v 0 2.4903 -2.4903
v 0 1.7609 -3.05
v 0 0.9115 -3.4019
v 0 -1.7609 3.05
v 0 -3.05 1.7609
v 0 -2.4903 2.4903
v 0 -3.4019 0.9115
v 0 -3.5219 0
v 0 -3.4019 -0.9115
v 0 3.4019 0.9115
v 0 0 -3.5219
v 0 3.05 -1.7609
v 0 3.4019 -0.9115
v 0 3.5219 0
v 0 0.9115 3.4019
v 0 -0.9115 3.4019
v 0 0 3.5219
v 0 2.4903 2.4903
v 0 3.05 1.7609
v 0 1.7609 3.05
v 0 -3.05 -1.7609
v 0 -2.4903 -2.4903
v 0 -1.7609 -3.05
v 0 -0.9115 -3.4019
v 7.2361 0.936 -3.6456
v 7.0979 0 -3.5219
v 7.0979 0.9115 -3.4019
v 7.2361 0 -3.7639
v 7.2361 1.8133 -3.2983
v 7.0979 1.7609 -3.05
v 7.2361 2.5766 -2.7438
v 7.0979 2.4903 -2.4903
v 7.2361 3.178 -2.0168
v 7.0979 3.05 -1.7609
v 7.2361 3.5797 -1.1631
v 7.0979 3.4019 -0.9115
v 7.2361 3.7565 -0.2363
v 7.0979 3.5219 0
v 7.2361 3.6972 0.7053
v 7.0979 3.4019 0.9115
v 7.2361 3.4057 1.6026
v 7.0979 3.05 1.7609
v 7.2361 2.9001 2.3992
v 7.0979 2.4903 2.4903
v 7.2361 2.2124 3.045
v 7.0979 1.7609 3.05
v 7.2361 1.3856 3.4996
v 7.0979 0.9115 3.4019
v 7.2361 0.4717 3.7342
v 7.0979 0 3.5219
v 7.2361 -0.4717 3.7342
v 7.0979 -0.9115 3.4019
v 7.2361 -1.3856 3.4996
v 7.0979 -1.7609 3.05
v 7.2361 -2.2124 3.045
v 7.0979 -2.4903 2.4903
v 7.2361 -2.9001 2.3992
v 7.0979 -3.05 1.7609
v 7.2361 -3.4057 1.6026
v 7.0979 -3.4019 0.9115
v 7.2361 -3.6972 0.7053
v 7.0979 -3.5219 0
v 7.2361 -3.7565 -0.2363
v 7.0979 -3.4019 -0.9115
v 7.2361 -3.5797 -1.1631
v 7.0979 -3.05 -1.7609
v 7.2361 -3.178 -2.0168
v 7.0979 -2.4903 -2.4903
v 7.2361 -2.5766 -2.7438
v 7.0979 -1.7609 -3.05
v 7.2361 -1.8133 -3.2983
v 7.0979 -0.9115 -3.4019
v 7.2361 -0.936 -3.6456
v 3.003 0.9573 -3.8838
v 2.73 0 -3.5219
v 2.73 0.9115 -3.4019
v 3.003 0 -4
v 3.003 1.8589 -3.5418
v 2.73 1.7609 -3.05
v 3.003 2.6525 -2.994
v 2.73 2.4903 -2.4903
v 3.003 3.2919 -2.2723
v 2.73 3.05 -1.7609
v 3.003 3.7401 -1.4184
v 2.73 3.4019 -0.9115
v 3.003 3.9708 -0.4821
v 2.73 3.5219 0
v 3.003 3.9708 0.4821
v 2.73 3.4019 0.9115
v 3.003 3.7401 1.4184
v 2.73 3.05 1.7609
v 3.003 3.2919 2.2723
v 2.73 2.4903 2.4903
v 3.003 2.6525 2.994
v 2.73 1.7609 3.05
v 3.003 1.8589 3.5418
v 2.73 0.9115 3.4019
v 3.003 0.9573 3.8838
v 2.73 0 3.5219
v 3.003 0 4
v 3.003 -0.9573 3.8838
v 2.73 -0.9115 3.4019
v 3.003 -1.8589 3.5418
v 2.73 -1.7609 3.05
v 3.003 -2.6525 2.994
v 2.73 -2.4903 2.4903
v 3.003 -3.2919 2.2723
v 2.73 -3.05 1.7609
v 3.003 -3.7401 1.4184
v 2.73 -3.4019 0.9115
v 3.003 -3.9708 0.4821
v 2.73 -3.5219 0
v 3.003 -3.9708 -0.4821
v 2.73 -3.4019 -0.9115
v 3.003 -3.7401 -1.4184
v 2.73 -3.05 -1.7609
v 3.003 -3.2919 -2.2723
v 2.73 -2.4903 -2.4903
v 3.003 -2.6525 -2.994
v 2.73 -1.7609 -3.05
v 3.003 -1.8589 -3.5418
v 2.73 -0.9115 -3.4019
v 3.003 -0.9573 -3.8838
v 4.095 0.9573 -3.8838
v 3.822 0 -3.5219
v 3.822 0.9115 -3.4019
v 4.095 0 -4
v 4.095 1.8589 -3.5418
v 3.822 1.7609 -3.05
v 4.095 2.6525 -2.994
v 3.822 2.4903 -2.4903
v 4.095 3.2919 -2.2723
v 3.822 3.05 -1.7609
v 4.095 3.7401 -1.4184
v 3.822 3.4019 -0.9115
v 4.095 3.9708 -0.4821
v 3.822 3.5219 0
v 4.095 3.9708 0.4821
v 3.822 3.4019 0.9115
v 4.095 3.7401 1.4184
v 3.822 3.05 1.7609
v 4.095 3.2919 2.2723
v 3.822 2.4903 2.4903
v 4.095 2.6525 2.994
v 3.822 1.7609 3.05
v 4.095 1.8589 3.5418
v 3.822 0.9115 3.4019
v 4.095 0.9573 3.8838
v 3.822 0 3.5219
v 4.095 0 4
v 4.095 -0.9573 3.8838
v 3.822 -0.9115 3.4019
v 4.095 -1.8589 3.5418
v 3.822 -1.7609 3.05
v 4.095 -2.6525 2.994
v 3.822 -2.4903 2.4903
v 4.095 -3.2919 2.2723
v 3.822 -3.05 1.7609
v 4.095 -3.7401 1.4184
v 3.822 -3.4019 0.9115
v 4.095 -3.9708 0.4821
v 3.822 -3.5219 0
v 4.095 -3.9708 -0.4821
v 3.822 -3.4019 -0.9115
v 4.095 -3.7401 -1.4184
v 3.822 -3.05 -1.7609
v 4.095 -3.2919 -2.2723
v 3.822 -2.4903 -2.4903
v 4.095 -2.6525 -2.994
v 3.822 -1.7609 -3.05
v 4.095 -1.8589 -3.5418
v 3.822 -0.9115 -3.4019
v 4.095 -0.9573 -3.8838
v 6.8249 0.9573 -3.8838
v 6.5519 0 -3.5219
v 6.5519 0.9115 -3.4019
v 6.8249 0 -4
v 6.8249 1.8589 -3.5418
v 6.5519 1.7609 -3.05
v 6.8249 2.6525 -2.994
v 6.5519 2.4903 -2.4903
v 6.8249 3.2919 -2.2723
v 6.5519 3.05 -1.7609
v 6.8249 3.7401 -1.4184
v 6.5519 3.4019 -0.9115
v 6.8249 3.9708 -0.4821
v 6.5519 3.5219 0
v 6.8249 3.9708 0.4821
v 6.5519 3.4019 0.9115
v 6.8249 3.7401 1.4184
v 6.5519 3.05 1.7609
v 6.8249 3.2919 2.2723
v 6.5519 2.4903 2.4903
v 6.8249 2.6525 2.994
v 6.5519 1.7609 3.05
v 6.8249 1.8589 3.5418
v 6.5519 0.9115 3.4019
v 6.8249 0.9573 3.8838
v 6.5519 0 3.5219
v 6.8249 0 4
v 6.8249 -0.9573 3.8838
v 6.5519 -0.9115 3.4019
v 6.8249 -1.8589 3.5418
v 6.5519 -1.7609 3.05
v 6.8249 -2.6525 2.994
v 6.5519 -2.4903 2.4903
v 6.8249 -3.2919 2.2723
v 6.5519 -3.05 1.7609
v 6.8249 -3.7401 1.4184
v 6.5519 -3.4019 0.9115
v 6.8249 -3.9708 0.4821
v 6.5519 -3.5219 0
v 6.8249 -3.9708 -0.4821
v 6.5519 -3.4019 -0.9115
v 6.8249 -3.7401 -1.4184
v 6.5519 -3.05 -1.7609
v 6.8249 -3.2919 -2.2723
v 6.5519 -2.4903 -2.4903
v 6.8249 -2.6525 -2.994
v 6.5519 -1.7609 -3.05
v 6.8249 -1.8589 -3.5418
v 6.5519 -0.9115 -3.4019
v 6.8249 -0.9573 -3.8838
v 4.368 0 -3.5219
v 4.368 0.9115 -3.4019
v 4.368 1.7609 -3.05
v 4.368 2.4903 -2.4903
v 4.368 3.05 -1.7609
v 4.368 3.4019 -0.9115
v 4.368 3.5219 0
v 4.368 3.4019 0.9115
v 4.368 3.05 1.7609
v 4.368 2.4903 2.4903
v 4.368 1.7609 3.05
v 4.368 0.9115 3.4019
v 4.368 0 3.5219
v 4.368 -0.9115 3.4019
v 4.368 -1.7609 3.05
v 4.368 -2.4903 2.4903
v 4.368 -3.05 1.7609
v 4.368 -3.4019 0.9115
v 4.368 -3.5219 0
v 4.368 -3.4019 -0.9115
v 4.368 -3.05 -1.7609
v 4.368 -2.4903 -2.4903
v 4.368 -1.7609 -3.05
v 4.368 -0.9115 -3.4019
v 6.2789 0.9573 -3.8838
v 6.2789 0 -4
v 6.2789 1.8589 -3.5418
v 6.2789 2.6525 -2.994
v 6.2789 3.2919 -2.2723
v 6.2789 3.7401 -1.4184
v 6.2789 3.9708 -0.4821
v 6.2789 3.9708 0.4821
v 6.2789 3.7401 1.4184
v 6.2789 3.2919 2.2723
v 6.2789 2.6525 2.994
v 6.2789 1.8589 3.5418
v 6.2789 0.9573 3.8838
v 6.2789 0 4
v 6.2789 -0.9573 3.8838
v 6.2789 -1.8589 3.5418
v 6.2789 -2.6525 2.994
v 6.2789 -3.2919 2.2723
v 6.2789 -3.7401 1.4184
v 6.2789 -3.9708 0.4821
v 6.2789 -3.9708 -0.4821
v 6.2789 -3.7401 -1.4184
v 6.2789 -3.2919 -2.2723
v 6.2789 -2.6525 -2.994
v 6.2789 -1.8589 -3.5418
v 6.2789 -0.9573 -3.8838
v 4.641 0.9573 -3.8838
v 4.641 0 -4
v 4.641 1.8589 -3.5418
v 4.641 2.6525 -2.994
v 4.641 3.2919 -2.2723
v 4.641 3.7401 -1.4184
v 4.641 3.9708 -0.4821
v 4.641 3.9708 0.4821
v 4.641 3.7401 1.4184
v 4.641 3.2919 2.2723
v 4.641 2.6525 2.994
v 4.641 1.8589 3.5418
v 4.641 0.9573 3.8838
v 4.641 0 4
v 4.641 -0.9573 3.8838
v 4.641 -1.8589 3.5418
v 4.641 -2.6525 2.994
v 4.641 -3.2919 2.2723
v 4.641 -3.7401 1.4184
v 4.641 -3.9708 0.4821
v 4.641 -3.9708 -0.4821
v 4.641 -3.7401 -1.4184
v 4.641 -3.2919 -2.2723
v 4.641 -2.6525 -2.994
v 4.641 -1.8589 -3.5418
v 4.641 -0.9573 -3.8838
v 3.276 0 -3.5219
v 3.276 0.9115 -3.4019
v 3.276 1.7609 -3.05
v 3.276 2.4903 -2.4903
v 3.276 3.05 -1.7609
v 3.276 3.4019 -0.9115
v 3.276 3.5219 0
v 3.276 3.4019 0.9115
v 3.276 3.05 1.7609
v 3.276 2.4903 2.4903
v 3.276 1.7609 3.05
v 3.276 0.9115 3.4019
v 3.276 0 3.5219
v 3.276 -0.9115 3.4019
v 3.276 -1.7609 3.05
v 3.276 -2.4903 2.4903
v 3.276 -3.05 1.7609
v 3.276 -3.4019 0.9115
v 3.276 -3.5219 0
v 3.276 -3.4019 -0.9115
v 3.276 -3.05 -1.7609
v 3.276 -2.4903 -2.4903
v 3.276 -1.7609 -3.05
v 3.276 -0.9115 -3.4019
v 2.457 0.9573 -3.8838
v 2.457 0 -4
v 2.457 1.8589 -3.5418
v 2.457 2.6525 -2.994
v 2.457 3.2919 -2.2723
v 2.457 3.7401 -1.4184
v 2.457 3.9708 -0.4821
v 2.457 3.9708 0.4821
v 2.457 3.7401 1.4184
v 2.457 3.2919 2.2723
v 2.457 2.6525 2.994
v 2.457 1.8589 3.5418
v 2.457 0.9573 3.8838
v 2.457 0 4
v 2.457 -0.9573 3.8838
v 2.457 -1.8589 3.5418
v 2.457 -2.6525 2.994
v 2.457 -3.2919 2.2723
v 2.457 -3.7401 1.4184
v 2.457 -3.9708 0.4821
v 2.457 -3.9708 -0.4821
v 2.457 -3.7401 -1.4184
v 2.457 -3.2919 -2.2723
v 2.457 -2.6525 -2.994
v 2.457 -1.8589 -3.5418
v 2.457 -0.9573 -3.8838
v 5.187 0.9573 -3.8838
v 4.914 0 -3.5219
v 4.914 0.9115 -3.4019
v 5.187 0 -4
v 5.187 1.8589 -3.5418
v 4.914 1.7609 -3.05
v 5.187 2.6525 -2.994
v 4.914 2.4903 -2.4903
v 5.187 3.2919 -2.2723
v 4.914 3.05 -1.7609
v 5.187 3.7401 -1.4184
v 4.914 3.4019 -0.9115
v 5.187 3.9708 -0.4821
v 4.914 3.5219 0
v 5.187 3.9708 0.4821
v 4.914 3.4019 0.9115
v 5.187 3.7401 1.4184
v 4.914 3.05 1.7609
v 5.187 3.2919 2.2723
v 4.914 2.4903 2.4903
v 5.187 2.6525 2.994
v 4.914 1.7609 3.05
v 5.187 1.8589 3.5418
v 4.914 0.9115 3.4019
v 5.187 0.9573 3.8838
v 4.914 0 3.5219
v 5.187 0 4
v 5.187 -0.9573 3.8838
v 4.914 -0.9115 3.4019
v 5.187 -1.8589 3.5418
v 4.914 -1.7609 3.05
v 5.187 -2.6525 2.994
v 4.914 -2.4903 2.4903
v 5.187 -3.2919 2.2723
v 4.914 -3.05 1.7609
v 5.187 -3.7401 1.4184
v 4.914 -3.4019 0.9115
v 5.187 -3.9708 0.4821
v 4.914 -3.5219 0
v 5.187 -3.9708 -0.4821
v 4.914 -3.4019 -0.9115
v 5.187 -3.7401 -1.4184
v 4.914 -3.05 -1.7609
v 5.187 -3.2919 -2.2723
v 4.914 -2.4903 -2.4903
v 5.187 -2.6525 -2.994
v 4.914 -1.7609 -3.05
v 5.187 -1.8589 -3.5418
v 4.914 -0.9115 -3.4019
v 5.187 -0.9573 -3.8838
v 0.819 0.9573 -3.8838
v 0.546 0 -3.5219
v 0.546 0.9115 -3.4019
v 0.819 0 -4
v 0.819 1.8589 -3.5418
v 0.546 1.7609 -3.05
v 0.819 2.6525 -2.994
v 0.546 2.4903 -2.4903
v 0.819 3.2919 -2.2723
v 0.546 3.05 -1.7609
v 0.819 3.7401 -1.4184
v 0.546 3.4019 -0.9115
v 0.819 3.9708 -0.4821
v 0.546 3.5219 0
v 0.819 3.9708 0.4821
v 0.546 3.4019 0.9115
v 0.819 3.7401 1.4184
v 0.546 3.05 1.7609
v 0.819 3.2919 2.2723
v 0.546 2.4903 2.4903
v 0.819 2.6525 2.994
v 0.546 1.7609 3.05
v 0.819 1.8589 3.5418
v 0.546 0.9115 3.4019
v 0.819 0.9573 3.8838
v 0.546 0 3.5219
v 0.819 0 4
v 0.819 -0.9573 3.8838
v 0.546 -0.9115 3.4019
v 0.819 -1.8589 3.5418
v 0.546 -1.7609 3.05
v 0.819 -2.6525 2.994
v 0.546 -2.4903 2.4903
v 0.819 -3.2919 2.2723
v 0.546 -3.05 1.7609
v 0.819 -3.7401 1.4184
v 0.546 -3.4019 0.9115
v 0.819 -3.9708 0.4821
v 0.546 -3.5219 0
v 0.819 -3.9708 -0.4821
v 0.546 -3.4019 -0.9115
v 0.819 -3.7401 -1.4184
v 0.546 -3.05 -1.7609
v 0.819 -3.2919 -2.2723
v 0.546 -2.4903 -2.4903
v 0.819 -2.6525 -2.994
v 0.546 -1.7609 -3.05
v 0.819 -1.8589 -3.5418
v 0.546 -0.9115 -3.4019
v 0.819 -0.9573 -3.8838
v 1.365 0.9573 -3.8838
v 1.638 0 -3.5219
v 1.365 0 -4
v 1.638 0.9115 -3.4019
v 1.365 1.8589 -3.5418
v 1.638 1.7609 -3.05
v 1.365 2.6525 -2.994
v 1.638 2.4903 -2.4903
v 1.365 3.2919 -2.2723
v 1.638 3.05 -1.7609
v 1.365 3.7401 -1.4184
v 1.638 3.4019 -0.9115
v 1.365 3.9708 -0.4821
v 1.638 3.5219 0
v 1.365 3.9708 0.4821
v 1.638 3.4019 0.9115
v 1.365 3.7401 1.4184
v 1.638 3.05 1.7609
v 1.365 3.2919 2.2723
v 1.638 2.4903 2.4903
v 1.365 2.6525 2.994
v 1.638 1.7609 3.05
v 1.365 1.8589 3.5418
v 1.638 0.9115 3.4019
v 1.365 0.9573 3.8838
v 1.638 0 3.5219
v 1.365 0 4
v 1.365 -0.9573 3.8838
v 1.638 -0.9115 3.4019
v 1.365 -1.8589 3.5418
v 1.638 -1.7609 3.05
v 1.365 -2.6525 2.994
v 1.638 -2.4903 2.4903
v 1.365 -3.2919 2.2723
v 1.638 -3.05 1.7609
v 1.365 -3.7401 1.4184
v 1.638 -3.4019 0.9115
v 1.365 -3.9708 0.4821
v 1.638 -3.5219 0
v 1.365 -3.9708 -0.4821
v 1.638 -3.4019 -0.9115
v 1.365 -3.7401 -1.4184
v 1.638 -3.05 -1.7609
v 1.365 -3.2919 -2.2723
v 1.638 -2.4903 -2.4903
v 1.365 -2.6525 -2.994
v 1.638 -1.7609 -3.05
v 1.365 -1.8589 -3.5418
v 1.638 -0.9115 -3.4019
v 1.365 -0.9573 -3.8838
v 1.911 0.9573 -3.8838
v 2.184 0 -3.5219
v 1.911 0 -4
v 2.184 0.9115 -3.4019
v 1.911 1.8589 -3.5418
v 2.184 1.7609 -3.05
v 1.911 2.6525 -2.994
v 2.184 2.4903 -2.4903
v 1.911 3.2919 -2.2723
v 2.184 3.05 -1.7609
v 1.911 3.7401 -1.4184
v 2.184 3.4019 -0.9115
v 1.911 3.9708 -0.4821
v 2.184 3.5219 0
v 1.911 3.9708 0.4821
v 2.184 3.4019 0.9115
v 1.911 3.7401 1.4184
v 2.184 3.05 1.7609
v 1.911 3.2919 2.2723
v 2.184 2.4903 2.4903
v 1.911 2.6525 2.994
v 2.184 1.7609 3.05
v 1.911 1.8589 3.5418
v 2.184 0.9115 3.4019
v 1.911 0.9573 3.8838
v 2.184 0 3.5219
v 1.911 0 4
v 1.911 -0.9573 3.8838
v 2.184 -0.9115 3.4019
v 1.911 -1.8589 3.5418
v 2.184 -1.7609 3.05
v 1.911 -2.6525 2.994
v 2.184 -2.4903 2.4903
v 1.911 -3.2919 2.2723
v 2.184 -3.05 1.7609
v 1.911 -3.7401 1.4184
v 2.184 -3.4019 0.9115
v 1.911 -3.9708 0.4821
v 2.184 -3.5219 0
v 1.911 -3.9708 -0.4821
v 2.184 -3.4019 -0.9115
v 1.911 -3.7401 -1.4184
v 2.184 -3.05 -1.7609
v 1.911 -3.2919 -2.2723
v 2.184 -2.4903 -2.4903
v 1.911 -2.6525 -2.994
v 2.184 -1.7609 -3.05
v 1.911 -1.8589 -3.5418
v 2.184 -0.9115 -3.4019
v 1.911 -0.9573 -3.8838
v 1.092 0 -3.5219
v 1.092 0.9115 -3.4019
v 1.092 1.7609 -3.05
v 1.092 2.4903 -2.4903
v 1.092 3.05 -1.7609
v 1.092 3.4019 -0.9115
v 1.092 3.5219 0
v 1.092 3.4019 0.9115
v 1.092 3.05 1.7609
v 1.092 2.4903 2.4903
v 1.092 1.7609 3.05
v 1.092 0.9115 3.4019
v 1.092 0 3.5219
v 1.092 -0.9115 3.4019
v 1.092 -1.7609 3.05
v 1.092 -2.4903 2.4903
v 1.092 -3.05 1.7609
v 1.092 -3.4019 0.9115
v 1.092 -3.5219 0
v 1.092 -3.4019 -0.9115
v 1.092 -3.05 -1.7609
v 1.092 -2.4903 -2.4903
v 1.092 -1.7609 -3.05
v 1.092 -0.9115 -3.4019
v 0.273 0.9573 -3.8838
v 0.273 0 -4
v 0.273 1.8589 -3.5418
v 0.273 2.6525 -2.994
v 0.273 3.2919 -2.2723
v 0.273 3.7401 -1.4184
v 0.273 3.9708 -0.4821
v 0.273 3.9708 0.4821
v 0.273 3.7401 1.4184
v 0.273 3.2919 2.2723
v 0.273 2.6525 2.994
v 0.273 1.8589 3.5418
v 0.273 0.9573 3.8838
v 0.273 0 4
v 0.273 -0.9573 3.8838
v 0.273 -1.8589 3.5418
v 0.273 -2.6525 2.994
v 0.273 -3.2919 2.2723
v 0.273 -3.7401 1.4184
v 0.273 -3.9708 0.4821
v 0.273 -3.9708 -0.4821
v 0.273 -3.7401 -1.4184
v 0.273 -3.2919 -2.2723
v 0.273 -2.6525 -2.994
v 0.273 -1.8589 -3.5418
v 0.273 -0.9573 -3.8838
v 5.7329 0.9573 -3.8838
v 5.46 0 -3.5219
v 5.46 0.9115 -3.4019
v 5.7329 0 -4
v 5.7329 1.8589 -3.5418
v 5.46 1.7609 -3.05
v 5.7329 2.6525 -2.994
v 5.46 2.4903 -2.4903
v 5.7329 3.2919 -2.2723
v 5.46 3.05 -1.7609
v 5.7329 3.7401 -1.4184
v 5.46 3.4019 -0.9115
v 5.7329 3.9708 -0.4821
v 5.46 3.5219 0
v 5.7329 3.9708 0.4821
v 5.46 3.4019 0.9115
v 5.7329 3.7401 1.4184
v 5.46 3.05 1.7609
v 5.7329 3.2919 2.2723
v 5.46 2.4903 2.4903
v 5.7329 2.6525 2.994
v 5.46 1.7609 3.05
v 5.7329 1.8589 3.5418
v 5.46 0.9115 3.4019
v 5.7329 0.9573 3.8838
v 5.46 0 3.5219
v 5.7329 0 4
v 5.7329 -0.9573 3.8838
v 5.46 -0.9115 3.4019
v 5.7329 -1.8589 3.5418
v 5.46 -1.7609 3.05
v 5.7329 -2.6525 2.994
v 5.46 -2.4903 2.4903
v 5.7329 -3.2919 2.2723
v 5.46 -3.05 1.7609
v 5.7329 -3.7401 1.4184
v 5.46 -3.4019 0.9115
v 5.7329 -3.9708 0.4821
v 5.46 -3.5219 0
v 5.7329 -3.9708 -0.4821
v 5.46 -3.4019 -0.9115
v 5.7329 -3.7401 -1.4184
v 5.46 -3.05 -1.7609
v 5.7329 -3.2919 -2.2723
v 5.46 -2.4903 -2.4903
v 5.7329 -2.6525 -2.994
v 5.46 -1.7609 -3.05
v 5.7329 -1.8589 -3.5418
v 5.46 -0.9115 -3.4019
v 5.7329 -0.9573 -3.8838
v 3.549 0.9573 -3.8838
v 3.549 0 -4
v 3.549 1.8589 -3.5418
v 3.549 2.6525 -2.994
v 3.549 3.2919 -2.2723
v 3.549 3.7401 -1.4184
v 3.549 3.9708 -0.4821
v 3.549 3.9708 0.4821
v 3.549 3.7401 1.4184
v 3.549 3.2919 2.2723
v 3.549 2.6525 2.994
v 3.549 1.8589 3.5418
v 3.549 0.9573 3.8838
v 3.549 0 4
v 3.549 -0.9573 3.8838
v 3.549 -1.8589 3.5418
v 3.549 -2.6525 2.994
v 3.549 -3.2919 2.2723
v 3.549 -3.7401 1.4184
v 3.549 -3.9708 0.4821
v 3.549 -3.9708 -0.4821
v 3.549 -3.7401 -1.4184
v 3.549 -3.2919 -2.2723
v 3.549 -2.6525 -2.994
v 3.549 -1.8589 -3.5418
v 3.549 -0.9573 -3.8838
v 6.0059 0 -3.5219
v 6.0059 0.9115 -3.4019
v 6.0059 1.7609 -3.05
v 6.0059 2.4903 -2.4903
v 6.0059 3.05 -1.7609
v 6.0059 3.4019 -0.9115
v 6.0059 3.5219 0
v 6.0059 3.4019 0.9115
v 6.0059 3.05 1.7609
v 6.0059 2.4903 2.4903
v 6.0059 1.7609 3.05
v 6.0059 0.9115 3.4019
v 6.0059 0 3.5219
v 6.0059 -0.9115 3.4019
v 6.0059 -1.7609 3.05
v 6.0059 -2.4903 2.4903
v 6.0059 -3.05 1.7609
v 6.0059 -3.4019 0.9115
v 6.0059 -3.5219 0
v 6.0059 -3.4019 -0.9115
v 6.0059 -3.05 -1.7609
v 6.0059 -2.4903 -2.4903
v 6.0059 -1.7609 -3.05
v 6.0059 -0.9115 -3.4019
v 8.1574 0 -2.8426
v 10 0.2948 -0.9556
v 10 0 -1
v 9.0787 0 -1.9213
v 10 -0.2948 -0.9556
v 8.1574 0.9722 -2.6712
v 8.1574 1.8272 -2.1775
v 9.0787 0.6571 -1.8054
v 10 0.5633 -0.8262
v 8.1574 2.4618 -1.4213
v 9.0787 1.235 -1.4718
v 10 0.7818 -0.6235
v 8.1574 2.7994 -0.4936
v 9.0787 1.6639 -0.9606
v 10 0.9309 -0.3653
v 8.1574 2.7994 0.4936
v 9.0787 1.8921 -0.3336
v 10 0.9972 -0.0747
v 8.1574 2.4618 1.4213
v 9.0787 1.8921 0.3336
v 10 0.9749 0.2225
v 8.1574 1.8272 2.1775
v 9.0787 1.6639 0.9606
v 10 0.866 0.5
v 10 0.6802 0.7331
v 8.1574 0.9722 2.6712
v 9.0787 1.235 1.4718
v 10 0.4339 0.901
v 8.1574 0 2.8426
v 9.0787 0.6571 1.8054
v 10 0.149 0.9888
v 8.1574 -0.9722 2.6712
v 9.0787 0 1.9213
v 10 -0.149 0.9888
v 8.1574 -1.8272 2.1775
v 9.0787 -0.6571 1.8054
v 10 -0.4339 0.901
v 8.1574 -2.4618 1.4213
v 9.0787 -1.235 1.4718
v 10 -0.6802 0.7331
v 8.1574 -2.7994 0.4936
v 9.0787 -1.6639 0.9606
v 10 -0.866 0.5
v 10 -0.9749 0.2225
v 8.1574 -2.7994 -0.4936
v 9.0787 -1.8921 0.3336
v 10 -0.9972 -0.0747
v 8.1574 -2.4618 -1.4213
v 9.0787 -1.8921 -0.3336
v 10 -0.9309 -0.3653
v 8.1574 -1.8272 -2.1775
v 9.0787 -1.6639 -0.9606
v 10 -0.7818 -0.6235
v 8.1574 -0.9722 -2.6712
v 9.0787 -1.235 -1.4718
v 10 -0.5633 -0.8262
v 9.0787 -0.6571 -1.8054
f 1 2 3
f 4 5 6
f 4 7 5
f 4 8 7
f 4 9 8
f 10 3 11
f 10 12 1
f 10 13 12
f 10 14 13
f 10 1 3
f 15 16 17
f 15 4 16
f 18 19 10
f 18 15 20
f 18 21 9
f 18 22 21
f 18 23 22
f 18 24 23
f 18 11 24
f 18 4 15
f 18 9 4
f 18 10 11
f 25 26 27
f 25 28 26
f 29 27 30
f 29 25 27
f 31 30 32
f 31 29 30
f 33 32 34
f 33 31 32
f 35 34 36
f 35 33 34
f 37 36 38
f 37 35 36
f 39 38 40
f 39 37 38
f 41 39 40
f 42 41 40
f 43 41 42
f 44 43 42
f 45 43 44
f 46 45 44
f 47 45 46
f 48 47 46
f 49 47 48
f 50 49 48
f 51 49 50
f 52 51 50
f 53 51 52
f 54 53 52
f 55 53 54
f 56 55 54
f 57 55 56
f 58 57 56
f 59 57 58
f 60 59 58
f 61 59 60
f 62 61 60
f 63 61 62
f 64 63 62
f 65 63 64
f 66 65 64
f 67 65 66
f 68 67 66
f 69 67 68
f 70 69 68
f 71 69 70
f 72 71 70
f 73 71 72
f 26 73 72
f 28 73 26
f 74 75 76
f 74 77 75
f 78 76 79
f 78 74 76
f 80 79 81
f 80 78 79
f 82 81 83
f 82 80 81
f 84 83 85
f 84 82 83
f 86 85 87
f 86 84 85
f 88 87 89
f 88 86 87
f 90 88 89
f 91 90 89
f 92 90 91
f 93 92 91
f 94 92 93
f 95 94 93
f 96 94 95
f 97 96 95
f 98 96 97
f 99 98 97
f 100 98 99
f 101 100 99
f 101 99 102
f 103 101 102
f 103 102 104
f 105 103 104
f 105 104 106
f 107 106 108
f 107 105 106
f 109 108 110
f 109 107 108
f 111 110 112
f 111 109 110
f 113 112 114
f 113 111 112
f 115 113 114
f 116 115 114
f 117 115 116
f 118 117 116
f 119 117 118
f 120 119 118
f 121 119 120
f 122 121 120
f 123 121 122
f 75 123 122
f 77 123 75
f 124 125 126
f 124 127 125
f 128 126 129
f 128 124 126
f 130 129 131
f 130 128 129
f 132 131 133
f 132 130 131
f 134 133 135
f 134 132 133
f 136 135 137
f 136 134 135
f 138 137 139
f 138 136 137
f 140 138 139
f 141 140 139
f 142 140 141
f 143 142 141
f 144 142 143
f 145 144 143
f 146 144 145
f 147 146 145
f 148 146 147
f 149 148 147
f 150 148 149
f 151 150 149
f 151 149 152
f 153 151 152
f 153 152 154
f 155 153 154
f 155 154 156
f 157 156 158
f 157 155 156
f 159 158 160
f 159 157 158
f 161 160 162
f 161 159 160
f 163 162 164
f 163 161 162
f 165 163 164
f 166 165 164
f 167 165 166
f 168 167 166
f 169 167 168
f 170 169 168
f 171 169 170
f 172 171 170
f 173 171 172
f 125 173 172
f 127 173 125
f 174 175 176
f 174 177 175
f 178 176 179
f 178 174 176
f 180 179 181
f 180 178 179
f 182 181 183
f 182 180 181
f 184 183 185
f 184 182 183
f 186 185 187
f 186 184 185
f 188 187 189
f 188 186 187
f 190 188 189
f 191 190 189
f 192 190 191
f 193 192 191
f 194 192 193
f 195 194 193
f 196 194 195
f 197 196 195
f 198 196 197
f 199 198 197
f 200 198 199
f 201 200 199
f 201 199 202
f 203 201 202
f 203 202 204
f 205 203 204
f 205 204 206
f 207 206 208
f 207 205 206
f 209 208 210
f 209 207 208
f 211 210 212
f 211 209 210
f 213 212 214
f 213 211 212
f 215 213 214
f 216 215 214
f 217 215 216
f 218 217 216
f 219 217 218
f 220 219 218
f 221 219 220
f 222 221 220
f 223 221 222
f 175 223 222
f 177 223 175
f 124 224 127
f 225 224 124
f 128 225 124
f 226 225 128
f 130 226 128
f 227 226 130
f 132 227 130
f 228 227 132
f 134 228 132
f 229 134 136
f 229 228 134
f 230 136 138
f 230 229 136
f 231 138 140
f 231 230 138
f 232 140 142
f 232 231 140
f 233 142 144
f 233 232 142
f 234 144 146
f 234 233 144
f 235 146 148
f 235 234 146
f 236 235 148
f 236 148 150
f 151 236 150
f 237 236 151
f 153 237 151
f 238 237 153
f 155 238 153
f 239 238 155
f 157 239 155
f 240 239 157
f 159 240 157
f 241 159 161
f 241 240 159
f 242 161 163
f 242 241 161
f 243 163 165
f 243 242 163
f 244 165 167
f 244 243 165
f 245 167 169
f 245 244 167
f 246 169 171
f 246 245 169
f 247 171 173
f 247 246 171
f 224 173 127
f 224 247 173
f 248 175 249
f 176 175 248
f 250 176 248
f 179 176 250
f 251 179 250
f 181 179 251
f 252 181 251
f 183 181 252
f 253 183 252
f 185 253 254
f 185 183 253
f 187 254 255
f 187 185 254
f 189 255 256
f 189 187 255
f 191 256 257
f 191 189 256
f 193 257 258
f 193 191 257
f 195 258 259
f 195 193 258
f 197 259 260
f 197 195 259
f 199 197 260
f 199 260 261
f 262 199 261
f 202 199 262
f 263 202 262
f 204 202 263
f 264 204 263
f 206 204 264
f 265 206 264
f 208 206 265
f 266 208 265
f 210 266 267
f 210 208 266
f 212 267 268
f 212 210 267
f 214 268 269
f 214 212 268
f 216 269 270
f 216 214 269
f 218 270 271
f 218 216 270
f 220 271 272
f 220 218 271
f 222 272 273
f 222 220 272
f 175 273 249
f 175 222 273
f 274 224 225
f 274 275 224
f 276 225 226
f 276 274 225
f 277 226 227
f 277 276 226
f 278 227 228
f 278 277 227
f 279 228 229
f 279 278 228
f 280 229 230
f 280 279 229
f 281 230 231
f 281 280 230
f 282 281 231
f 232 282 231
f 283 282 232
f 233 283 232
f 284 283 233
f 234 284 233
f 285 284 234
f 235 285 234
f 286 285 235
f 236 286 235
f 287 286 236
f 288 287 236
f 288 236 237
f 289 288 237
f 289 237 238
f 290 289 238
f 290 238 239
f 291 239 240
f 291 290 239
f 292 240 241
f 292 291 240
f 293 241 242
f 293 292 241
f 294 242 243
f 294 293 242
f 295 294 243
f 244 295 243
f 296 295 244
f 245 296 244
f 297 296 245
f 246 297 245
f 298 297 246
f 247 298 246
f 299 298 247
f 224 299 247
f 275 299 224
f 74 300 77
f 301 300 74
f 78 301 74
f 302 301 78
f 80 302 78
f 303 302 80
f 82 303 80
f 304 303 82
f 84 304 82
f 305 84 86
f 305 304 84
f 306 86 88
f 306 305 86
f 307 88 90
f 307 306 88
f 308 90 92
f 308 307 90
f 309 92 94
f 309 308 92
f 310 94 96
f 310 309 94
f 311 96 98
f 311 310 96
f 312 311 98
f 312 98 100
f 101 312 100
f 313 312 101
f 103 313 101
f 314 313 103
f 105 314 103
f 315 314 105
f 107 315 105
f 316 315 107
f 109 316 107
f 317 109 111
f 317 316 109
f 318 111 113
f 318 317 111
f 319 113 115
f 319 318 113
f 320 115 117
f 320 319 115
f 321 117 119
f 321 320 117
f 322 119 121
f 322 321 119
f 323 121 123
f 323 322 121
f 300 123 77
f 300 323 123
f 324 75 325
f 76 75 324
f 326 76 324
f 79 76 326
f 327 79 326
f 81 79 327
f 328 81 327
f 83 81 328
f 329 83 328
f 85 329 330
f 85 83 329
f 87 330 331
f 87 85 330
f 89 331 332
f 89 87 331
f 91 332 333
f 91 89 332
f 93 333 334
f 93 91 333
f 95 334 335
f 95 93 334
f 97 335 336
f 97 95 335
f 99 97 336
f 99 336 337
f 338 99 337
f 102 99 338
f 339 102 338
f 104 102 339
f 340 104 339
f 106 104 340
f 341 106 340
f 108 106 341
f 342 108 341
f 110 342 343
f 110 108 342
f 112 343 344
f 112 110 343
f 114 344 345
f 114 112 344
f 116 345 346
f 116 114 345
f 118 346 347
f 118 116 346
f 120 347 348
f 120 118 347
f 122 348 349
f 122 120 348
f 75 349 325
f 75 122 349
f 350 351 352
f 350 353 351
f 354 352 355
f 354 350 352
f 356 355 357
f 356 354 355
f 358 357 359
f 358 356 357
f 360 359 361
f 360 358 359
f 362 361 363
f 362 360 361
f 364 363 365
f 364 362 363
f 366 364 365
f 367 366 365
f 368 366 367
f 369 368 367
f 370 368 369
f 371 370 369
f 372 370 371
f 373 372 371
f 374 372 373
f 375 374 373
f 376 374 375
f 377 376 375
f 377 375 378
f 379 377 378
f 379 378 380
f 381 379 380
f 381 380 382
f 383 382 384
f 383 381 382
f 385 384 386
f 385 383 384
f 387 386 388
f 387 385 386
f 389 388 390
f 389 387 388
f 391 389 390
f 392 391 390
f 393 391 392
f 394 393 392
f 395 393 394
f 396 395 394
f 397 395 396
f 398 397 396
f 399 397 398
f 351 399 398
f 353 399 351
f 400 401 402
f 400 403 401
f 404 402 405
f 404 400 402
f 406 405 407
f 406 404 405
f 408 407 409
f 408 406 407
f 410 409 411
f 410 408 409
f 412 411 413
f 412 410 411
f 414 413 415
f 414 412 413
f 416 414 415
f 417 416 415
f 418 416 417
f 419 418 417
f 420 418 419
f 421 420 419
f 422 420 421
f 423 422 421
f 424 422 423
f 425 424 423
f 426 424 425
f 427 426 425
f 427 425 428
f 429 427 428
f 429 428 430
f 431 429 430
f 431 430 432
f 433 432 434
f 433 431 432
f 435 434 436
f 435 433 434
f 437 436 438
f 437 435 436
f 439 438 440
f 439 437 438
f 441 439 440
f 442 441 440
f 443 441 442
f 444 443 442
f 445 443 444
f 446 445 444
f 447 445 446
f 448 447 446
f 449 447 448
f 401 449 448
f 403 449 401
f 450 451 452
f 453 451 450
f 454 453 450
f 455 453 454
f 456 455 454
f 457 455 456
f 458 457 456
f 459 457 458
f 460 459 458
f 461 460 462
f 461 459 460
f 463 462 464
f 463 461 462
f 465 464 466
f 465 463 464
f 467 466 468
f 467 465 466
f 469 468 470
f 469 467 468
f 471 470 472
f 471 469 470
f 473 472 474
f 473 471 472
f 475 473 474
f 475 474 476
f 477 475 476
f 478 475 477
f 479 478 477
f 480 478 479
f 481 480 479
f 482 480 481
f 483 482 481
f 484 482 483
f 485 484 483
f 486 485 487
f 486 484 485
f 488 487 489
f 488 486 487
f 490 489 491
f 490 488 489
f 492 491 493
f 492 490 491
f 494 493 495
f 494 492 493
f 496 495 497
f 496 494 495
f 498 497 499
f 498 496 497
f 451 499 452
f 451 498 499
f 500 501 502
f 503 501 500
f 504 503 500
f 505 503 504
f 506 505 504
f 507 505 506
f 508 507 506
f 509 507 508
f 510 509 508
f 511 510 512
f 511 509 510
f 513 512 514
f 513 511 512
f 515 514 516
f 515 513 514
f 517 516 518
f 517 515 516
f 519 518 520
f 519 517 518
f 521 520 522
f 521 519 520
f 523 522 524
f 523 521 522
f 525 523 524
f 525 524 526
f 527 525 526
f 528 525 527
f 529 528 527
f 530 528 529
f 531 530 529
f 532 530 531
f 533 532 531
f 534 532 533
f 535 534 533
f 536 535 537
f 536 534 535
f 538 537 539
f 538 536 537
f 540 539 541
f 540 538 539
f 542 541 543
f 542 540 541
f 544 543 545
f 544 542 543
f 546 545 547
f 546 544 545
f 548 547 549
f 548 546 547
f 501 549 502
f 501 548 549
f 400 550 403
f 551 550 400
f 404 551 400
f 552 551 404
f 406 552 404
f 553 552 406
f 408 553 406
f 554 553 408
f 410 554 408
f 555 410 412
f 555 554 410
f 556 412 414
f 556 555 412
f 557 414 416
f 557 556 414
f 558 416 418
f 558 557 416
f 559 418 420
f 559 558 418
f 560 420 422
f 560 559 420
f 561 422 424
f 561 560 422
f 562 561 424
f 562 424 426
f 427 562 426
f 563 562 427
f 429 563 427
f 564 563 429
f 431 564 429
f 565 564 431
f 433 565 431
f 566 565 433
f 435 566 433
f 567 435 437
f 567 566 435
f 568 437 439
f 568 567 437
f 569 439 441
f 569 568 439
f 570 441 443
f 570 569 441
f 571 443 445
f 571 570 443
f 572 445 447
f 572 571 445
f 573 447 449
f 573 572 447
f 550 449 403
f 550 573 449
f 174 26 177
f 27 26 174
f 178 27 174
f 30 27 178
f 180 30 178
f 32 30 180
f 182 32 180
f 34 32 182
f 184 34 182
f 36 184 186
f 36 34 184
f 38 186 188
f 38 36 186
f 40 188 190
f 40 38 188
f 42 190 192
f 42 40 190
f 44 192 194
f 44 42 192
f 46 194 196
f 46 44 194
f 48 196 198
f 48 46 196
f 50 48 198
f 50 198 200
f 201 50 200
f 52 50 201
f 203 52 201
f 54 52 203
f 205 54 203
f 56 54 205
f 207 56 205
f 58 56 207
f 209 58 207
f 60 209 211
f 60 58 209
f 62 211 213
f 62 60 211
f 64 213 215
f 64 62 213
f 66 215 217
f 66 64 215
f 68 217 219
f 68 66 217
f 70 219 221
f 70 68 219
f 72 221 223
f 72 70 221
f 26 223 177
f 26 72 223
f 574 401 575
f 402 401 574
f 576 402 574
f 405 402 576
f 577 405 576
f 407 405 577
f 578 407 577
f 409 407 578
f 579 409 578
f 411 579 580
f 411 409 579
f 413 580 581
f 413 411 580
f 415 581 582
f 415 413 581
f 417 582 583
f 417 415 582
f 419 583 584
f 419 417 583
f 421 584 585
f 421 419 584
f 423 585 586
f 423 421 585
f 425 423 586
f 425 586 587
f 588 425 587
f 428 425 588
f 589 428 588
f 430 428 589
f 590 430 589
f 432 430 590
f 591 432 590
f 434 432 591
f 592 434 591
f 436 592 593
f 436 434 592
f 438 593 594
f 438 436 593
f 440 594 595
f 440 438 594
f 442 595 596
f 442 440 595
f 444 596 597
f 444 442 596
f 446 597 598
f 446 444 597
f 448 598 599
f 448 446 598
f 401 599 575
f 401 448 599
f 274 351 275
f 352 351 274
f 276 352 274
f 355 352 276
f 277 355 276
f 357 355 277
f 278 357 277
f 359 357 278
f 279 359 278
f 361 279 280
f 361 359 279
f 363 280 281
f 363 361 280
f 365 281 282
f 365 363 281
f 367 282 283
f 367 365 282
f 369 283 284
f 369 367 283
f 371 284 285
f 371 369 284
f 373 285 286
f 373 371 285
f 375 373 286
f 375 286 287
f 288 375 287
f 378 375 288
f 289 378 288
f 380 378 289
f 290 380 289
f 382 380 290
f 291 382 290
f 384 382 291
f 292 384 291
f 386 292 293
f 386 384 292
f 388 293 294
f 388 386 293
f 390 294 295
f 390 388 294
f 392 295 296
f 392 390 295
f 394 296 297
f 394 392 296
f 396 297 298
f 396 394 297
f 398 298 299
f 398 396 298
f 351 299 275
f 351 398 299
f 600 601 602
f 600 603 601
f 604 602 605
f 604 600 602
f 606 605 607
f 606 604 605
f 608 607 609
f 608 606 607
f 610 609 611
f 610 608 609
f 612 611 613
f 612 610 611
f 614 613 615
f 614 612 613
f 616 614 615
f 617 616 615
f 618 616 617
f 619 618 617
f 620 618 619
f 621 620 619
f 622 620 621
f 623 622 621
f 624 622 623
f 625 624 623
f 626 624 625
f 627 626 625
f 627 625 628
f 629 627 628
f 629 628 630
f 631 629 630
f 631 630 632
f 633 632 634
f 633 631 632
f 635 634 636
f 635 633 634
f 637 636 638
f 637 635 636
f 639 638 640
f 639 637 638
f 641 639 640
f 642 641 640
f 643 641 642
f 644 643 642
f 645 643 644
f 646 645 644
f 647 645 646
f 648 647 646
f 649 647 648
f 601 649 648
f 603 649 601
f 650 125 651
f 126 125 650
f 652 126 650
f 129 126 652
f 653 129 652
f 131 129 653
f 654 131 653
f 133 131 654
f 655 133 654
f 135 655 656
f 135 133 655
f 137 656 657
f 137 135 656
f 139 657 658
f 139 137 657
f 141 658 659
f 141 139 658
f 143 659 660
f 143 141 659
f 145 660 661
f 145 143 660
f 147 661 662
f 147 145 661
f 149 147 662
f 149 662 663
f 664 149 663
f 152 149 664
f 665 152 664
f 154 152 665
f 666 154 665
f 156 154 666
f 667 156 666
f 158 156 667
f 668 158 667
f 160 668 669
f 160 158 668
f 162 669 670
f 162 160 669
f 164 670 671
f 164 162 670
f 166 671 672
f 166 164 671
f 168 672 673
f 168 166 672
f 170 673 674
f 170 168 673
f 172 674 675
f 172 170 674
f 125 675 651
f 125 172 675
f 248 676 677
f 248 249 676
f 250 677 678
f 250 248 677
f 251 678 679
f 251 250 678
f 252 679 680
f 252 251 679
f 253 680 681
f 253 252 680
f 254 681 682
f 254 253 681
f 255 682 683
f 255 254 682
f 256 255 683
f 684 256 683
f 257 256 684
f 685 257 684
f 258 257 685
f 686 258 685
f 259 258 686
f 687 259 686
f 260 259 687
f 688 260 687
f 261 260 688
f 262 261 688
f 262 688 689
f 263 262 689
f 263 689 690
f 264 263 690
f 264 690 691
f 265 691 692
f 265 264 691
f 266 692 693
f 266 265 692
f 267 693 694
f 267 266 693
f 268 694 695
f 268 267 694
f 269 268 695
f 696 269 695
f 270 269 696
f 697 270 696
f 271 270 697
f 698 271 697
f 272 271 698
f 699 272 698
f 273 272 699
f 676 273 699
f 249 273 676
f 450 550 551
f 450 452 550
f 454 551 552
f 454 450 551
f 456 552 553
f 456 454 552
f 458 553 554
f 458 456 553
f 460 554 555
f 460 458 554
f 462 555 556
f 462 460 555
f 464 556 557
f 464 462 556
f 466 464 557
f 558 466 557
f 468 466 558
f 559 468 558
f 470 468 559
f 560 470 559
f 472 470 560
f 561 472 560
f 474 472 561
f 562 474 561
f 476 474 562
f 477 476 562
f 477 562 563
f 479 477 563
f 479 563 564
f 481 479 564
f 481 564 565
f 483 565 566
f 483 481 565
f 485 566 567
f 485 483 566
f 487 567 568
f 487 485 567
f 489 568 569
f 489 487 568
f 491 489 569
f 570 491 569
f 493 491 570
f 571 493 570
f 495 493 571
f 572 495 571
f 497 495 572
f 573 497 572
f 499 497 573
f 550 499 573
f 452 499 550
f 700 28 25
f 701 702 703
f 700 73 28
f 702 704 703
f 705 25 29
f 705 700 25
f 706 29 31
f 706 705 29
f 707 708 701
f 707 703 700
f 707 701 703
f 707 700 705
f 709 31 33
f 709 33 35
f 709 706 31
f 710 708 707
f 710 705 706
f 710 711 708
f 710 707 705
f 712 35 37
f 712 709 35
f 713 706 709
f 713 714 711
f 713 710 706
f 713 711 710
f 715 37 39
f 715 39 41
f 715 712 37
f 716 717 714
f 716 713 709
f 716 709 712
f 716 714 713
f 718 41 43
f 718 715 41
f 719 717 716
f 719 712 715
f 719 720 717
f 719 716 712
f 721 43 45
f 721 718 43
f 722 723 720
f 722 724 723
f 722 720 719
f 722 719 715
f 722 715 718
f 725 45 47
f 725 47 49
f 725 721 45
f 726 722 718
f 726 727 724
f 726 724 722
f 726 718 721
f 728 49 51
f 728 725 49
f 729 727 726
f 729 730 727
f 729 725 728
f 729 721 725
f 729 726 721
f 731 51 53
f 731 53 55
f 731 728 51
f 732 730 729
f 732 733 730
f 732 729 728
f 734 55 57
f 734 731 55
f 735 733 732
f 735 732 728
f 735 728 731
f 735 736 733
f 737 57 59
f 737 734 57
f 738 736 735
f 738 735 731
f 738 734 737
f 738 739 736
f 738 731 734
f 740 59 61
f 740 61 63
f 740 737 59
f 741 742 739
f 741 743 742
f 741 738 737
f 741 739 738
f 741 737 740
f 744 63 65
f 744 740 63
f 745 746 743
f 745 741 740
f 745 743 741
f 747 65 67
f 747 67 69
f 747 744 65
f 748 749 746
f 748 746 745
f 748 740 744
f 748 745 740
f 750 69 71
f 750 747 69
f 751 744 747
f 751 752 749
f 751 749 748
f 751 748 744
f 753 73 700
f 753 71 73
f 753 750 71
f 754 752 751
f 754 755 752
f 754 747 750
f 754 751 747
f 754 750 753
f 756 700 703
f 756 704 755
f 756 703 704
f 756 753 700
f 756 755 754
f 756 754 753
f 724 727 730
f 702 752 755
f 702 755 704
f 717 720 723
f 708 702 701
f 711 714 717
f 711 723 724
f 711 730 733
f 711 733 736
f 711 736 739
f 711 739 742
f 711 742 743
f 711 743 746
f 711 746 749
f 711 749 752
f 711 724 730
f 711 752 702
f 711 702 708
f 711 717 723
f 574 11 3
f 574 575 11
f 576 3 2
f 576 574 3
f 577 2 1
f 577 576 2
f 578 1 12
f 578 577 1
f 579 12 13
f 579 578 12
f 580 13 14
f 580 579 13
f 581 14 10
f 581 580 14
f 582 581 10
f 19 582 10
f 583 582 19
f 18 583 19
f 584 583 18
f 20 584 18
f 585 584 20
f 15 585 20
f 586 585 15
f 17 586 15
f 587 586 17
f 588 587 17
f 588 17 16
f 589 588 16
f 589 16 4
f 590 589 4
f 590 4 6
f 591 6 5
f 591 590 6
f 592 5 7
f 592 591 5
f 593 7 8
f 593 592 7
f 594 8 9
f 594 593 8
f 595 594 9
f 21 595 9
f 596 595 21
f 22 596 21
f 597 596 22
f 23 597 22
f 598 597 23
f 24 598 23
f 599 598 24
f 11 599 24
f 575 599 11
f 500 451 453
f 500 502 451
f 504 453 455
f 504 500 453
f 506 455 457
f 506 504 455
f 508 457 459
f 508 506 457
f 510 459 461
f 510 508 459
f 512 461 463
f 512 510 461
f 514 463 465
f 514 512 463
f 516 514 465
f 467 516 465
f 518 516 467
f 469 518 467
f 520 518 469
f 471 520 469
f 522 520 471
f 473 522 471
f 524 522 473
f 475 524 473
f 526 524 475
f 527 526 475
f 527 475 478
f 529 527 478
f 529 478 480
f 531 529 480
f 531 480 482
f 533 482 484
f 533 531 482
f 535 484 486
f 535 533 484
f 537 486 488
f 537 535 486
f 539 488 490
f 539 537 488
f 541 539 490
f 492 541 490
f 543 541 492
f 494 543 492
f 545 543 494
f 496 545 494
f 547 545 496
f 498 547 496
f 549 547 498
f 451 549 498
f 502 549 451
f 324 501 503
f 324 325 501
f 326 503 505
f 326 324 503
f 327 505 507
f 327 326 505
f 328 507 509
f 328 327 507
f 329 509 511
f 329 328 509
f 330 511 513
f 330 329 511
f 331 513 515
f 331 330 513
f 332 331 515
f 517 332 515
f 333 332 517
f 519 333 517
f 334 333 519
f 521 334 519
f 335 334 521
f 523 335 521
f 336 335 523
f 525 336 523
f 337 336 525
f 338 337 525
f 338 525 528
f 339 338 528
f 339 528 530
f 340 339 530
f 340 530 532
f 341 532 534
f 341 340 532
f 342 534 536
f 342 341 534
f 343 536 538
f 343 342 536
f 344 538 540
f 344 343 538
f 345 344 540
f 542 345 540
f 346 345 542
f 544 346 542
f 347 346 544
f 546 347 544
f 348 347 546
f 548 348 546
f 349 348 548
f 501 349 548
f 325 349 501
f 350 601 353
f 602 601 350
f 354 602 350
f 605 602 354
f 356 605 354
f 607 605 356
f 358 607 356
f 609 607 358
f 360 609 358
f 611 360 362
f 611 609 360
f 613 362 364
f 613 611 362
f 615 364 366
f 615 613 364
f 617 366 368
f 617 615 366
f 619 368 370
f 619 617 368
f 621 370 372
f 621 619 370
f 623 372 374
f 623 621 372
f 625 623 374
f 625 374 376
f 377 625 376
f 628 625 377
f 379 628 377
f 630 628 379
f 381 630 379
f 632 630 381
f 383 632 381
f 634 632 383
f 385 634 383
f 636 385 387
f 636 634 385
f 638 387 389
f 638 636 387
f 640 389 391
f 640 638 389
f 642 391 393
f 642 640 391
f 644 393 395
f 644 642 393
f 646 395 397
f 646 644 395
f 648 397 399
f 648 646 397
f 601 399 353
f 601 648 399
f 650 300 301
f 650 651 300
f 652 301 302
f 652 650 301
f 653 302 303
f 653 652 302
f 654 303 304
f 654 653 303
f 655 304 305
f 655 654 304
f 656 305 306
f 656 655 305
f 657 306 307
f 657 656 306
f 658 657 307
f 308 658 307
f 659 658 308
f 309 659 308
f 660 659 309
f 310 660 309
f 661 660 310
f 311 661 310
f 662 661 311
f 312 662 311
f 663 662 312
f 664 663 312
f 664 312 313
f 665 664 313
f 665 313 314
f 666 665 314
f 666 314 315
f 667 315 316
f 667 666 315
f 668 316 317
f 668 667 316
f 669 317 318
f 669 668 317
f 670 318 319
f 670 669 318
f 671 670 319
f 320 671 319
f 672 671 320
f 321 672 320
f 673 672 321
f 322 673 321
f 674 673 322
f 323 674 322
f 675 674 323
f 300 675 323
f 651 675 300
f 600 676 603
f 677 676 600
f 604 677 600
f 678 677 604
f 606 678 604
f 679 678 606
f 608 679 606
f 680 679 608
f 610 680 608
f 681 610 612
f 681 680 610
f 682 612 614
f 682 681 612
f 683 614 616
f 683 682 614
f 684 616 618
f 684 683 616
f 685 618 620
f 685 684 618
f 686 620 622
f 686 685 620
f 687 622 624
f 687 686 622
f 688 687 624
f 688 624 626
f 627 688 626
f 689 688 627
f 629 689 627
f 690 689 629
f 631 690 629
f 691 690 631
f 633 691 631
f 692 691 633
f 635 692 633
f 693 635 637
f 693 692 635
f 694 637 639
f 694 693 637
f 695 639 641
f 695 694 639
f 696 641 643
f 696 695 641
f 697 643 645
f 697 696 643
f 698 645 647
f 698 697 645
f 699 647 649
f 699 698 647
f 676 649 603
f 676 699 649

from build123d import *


with BuildPart() as part:
    # 草图1 → 旋转1 (revolve)
    with BuildSketch(Plane.XY, mode=Mode.PRIVATE) as revolve_1_sk:
        Polygon((10, 0), (0, 0), (0, 3.521877004), (0.272997582, 4), (0.545995165, 3.521877004), (0.818992747, 4), (1.091990329, 3.521877004), (1.364987912, 4), (1.637985494, 3.521877004), (1.910983076, 4), (2.183980659, 3.521877004), (2.456978241, 4), (2.729975823, 3.521877004), (3.002973406, 4), (3.275970988, 3.521877004), (3.548968571, 4), (3.821966153, 3.521877004), (4.094963735, 4), (4.367961318, 3.521877004), (4.6409589, 4), (4.913956482, 3.521877004), (5.186954065, 4), (5.459951647, 3.521877004), (5.732949229, 4), (6.005946812, 3.521877004), (6.278944394, 4), (6.551941976, 3.521877004), (6.824939559, 4), (7.097937141, 3.521877004), (7.236117111, 3.763882889), (10, 1), align=None)
    revolve(revolve_1_sk.sketch.rotate(Axis((10, 0, 0), (1, 0, 0)), 270), axis=Axis((10, 0, 0), (1, 0, 0)))


solid = part.part
